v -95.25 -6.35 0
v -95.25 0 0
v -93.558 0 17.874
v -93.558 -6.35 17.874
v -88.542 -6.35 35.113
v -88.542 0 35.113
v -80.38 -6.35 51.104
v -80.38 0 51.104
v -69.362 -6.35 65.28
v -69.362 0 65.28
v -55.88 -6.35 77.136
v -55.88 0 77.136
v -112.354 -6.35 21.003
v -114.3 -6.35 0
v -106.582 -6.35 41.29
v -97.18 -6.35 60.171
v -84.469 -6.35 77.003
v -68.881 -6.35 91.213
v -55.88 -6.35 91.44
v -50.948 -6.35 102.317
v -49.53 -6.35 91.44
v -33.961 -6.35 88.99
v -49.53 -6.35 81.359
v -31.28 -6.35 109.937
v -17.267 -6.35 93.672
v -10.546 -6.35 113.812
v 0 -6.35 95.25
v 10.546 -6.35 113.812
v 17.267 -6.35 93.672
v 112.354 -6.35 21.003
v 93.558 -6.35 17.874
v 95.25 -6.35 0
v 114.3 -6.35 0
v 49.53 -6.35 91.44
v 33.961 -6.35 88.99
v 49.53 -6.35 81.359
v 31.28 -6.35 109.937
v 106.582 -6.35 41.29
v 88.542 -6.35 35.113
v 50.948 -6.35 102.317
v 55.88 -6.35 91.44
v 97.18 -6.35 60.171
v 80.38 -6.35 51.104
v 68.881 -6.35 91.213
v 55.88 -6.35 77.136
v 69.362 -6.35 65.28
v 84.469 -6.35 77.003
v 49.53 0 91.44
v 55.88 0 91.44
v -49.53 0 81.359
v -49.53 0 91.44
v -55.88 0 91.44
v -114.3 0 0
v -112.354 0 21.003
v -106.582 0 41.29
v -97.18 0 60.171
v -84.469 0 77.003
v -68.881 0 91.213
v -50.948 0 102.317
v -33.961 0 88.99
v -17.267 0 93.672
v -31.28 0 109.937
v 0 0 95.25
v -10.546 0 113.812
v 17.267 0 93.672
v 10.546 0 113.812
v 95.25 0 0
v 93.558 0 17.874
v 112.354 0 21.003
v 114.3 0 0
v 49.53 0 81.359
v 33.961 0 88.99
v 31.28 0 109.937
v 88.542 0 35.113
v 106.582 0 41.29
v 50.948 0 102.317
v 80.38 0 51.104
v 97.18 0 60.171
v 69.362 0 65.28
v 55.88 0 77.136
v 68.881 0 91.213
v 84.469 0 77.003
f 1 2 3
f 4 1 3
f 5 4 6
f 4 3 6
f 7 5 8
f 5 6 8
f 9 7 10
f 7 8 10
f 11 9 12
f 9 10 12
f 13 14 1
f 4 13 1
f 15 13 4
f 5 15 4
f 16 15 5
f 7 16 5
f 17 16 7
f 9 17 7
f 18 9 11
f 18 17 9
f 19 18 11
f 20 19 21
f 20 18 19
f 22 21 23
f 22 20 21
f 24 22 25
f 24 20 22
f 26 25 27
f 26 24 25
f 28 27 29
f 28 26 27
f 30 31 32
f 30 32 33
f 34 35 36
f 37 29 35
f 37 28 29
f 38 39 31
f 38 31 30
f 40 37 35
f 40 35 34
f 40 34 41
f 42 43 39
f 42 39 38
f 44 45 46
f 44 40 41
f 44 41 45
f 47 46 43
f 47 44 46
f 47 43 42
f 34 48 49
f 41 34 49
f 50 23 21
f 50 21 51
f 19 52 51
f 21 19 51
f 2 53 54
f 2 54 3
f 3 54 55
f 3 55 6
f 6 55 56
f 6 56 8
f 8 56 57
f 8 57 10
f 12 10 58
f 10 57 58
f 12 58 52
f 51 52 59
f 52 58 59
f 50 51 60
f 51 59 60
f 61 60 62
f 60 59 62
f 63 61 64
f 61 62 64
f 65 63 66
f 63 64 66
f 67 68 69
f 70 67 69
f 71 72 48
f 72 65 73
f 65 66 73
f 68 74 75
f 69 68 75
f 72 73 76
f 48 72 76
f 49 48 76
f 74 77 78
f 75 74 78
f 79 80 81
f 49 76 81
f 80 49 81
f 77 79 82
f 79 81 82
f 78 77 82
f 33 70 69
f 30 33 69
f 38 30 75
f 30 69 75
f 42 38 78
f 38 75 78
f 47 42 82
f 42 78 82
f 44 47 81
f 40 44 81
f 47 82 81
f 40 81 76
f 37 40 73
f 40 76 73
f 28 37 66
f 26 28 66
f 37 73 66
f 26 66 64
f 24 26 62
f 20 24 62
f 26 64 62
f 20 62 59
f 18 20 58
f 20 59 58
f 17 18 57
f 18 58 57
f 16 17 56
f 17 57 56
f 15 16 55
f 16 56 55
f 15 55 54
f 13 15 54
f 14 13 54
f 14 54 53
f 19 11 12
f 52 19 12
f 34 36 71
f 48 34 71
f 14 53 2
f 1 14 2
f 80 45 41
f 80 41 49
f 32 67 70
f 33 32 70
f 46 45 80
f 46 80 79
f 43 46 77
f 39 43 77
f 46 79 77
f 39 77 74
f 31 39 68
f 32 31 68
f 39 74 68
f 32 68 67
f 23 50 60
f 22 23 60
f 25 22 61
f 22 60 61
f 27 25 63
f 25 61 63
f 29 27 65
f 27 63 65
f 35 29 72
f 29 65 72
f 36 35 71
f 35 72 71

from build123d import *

# Parameters (mm, degrees)
F1_DEPTH = 6.35
F3_W     = 6.35
F3_H     = 6.35
F4_DEPTH = 30.48


with BuildPart() as f1:
    # F0 (on Front) → F1 (new body)
    with BuildSketch(Plane.XZ):
        with BuildLine():
            Line((95.25, 0), (114.3, 0))
            ThreePointArc((114.3, 0), (0, 114.3), (-114.3, 0))
            Line((-114.3, 0), (-95.25, 0))
            ThreePointArc((-95.25, 0), (0, 95.25), (95.25, 0))
        make_face()
    extrude(amount=F1_DEPTH)

    # F3 (on offset) → F4 (cut)
    with BuildSketch(Plane.XY.offset(60.96)):
        with Locations((-52.705, -3.175)):
            Rectangle(F3_W, F3_H)
        with Locations((52.705, -3.175)):
            Rectangle(F3_W, F3_H)
    extrude(amount=F4_DEPTH, mode=Mode.SUBTRACT)


solid = f1.part
